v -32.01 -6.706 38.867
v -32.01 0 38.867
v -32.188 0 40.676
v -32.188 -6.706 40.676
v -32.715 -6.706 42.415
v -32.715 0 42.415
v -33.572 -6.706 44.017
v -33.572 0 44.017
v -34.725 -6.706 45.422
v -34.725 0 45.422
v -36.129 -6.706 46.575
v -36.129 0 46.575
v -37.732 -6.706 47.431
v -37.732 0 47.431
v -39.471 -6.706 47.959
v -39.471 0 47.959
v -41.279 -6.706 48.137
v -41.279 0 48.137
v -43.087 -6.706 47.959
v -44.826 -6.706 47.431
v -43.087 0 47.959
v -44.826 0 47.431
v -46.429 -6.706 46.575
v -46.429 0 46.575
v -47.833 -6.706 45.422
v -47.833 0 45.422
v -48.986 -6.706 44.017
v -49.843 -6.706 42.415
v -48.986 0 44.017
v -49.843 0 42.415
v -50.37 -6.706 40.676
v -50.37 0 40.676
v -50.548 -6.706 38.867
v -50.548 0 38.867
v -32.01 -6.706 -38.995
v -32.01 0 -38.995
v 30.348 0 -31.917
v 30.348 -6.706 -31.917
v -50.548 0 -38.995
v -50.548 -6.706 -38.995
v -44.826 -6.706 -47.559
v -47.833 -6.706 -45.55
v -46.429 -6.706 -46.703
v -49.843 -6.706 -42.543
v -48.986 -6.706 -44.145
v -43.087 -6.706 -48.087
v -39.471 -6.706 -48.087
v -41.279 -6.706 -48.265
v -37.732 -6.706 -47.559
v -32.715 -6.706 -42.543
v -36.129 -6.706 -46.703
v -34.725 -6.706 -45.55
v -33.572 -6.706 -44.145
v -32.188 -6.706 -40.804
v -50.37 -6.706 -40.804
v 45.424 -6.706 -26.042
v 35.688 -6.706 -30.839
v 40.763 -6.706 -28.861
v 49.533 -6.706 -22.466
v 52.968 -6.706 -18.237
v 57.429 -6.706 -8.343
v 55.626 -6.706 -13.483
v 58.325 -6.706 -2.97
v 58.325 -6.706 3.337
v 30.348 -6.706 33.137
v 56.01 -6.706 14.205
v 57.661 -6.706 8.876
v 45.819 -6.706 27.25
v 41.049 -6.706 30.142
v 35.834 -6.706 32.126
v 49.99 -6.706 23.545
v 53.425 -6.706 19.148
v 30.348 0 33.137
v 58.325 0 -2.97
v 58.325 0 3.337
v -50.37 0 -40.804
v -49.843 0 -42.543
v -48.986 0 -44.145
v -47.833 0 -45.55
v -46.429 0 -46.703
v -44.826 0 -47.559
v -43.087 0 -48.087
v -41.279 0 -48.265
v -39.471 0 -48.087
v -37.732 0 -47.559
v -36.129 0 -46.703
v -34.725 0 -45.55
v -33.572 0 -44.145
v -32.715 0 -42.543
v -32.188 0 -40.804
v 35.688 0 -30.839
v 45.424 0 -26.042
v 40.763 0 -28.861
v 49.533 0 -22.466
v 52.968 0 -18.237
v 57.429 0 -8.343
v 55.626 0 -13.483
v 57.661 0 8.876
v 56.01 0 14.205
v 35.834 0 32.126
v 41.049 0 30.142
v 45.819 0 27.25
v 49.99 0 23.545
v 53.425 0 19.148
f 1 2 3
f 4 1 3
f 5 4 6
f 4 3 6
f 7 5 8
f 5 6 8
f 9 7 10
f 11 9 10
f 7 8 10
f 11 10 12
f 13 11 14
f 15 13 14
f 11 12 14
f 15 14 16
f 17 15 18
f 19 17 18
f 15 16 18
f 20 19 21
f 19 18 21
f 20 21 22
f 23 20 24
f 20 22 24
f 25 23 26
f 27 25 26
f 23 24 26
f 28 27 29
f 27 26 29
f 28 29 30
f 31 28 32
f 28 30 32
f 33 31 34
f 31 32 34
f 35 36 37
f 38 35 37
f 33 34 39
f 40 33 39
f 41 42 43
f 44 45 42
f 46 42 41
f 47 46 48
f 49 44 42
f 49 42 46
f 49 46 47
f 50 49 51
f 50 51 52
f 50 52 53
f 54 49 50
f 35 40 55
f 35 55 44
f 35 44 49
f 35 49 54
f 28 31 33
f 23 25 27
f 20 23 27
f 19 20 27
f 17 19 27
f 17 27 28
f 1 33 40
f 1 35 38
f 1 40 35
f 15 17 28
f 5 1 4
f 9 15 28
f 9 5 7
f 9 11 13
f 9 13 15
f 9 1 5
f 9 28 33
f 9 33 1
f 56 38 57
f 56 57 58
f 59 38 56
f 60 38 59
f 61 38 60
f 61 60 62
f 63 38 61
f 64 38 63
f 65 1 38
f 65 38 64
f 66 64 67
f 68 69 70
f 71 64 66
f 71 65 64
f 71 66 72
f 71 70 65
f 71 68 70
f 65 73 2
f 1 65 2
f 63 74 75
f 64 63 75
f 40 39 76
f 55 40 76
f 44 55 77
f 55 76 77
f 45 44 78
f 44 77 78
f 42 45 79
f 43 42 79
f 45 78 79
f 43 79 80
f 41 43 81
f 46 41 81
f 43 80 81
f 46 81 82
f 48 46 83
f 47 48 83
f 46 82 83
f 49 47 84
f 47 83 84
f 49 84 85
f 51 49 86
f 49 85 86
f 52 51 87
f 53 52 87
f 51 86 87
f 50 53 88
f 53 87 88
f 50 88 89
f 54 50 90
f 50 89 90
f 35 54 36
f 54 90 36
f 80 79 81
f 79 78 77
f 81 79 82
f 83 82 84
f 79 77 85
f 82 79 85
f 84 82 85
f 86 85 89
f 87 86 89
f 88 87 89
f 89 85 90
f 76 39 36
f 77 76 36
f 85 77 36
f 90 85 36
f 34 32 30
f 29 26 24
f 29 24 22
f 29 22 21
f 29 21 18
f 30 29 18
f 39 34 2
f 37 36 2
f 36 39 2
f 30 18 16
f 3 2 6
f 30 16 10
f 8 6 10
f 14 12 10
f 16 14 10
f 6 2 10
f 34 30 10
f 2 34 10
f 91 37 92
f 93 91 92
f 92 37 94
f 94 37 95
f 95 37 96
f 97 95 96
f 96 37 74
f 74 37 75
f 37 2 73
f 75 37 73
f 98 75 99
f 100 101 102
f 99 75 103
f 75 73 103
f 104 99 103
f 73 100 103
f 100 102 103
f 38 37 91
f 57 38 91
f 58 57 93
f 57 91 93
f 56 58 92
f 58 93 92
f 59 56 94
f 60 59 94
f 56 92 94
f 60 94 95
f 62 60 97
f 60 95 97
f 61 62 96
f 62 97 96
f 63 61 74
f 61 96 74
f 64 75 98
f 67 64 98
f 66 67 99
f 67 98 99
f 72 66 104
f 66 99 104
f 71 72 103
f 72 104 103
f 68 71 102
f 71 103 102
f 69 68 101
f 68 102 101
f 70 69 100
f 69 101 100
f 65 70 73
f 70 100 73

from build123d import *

# Parameters (mm, degrees)
F1_DEPTH = 6.7056


# Not quite as in the source:
# - the program builds the solid bodies; features that only make, move or delete a surface that nothing else refers to are left out


with BuildPart() as f1:
    # F0 (on Front) → F1 (new body)
    with BuildSketch(Plane.XZ):
        with BuildLine():
            ThreePointArc((-32.0095643401, 38.8673432171), (-41.2789452821, 48.1367241591), (-50.5483262241, 38.8673432171))
            Line((-50.5483262241, 38.8673432171), (-50.5483262241, -38.9954559505))
            ThreePointArc((-50.5483262241, -38.9954559505), (-41.2789452821, -48.2648368925), (-32.0095643401, -38.9954559505))
            Line((-32.0095643401, -38.9954559505), (30.3480885923, -31.9170206785))
            ThreePointArc((30.3480885923, -31.9170206785), (49.5331583117, -22.4657405577), (58.3247691393, -2.9695569538))
            Line((58.3247691393, -2.9695569538), (58.3247691393, 3.3366130665))
            ThreePointArc((58.3247691393, 3.3366130665), (49.99023947, 23.5446765042), (30.3480885923, 33.1371799111))
            Line((30.3480885923, 33.1371799111), (-32.0095643401, 38.8673432171))
        make_face()
    extrude(amount=F1_DEPTH)


solid = f1.part
